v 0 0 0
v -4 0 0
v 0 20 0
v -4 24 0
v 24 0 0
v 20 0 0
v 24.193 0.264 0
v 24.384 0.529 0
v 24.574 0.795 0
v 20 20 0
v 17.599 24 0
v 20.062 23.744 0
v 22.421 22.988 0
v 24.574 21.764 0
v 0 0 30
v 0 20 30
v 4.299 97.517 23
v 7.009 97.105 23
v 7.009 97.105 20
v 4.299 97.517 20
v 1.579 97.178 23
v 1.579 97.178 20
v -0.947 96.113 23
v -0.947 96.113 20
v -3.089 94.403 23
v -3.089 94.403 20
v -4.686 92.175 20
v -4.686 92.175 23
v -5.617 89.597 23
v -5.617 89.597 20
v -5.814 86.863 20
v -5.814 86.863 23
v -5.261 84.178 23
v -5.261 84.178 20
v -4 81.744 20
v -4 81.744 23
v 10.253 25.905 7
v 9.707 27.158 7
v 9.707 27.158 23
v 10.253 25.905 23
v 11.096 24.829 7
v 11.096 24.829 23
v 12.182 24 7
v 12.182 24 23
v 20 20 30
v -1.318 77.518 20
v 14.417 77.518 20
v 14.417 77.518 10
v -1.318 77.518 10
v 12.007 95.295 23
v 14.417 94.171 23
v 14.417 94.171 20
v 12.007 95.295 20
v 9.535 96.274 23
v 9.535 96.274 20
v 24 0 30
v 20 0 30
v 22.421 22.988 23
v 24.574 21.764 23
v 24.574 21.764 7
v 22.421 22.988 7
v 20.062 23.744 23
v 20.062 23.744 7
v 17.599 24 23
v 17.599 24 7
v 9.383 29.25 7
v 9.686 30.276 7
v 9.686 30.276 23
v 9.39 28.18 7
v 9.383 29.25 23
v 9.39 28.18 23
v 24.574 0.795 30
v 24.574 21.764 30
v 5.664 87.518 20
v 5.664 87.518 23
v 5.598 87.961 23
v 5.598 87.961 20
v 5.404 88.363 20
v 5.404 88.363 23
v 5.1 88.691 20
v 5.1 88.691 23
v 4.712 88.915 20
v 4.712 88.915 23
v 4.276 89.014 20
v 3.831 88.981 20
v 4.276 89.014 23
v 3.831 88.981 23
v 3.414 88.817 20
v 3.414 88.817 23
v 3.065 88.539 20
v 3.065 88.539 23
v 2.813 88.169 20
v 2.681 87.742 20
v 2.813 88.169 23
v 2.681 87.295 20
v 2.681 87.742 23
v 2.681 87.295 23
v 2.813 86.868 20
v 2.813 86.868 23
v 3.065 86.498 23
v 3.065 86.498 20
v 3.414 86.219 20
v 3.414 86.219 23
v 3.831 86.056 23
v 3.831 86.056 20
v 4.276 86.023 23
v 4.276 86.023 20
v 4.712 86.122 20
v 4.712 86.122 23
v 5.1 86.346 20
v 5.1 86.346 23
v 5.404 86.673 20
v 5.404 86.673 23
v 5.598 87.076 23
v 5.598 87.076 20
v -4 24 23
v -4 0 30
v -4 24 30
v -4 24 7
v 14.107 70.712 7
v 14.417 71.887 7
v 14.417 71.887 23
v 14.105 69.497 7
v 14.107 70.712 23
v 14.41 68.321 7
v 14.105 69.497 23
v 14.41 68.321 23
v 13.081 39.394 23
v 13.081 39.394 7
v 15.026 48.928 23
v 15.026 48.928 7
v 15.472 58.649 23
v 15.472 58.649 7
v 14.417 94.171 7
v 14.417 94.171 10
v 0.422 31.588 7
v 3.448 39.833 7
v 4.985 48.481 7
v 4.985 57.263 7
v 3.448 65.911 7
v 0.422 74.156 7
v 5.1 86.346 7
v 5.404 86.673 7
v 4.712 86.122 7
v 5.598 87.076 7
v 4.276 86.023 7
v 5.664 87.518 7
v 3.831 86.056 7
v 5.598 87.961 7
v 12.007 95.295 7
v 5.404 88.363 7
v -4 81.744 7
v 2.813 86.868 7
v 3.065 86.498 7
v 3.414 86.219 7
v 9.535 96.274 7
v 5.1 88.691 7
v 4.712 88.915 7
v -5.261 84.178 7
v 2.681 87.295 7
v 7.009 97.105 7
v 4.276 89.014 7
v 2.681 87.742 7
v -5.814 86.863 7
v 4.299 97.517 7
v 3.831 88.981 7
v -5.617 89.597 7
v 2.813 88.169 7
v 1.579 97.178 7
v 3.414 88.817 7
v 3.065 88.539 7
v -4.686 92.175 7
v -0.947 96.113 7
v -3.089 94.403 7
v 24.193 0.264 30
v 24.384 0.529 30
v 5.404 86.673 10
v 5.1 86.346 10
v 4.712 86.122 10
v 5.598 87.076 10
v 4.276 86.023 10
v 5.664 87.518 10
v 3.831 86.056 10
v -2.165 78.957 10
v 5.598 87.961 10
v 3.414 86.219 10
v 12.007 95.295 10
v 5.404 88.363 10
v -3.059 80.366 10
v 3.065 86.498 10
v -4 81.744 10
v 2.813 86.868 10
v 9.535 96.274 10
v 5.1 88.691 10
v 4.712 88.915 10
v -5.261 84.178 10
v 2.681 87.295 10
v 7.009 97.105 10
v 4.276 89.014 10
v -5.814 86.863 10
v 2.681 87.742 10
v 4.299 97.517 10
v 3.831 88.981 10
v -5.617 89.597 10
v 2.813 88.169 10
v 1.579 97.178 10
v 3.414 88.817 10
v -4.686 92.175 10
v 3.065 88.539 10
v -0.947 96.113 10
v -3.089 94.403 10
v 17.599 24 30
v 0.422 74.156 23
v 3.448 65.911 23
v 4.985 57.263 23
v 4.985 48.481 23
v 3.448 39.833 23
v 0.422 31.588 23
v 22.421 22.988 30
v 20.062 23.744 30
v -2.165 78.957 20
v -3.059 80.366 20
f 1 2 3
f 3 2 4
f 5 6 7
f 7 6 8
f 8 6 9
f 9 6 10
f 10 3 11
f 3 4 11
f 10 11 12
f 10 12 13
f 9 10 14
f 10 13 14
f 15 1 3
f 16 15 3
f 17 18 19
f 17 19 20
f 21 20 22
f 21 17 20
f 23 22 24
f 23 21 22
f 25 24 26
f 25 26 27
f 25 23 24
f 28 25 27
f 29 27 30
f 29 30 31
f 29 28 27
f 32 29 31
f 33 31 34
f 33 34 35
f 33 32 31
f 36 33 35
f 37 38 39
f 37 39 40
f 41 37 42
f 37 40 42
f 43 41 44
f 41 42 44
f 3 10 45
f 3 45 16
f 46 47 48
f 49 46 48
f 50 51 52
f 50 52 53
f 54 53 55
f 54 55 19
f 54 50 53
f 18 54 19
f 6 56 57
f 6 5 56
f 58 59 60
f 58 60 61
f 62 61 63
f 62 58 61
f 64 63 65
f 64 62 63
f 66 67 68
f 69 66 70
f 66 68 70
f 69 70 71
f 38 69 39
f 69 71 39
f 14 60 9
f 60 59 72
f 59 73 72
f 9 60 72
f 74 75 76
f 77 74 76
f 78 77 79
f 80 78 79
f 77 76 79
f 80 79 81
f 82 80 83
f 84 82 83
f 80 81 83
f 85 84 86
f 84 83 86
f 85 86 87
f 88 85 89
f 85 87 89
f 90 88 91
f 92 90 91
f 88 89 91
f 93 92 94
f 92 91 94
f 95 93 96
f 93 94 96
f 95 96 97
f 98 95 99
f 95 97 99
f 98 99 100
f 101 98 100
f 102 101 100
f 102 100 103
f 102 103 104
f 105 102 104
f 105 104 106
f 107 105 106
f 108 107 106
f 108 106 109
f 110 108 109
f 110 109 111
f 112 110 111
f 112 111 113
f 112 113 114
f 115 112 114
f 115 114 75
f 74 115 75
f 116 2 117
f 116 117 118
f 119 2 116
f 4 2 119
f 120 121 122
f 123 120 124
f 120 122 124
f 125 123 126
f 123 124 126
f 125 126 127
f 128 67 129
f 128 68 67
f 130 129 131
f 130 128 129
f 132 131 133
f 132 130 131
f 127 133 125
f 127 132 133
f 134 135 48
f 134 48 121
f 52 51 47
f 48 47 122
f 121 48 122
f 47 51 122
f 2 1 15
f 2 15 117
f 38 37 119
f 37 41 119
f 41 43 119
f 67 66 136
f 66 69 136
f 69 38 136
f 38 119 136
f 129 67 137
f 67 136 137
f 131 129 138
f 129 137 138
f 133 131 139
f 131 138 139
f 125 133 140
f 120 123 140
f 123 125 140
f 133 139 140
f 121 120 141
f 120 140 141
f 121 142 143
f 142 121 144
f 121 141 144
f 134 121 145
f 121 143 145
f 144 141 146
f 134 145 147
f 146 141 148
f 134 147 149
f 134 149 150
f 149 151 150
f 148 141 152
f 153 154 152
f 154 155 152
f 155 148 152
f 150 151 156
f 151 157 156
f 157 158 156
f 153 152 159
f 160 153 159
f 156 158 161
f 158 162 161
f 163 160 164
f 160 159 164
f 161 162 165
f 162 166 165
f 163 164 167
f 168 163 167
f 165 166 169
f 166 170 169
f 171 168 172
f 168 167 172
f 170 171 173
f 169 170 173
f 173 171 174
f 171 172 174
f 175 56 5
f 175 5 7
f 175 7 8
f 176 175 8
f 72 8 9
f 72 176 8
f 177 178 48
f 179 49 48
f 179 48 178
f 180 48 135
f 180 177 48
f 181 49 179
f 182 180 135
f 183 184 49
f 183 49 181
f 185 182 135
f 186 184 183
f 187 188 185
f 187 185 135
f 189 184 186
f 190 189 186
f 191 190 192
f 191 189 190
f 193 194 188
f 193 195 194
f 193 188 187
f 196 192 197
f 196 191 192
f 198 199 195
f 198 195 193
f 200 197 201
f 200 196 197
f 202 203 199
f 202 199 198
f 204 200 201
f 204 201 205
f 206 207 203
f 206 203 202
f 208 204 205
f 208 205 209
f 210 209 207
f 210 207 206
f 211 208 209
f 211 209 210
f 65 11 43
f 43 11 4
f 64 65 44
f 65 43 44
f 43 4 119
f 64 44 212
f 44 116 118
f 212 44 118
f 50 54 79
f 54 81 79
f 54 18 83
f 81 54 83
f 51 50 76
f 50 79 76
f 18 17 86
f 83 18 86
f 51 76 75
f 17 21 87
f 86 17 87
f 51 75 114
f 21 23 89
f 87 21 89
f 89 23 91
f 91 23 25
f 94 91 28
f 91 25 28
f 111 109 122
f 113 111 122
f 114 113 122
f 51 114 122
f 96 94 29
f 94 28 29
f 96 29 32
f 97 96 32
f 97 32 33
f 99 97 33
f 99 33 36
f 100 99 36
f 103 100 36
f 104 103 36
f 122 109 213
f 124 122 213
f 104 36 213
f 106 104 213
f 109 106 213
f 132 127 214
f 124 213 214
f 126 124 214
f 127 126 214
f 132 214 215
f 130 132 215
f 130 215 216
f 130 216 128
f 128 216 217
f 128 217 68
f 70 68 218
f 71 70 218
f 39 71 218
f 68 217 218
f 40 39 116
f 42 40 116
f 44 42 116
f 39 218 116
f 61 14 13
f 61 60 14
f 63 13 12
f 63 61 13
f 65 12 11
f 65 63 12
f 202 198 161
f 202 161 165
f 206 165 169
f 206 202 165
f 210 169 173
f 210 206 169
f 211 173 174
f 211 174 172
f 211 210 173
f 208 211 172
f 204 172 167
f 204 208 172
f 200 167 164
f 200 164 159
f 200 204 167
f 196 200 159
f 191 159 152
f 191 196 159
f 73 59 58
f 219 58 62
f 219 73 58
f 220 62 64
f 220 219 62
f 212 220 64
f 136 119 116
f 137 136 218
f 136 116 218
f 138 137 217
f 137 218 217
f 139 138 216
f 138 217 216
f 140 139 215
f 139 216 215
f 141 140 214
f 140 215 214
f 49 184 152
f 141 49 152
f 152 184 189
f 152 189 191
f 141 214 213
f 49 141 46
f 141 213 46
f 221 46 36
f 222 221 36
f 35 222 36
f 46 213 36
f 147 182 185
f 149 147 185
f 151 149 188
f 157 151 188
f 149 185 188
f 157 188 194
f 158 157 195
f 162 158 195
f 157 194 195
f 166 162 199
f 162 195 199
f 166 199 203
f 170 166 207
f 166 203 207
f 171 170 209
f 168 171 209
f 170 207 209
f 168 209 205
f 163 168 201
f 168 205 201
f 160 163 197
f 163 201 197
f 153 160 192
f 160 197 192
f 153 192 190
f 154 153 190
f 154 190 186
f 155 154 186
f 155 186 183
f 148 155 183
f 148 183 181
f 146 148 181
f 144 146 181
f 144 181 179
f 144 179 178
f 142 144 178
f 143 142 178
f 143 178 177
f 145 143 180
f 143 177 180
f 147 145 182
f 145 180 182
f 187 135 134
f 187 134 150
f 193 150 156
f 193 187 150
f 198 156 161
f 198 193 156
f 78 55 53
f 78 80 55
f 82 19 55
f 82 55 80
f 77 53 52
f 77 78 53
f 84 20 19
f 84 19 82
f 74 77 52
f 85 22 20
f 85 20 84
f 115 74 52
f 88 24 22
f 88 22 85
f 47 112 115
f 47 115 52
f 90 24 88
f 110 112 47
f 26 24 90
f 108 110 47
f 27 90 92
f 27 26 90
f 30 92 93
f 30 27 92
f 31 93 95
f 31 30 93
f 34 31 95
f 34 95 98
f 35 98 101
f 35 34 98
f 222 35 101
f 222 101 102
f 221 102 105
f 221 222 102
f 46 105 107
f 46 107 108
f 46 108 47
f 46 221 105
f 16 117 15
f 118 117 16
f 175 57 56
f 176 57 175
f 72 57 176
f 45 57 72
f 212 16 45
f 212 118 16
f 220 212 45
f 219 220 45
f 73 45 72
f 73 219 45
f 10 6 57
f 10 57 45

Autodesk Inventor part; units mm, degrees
ref_plane "YZ Plane" through (0, 0, 0) normal (1, 0, 0) x (0, 1, 0)
sketch "Эскиз1" plane through (0, 0, 0) normal (0, 0, 1) x (1, 0, 0)
  line L0 (0, 0) -> (20, 0) construction
  line L1 (20, 0) -> (20, 20) construction
  line L2 (20, 20) -> (0, 20) construction
  line L3 (0, 20) -> (0, 0) construction
  line L4 (0, 0) -> (0, 20)
  line L5 (0, 0) -> (-4, 0)
  line L6 (-4, 0) -> (-4, 24)
  line L7 (-4, 24) -> (24, 24)
  line L8 (24, 24) -> (24, 0)
  line L9 (24, 0) -> (20, 0)
  line L10 (20, 0) -> (20, 20)
  line L11 (20, 20) -> (0, 20)
  dimension "d0" = 20
  dimension "d1" = 4
  dimension "d2" = 4
extrude "Выдавливание1" add sketch "Эскиз1" along normal blind 30
sketch "Эскиз2" plane through (0, 0, 30) normal (0, 0, 1) x (1, 0, 0)
  line L0 (24, 0) -> (24, 24) projected
  arc A0 (24, 0) -> (38.6, 61.3222) centre (-41.6488, 48.0293) ccw
  arc A1 (38.6, 61.3222) -> (7.0088, 97.1053) centre (-5.7899, 53.9692) ccw
  line L1 (-4, 24) -> (-4, 0) projected
  arc A2 (-4, 24) -> (-4, 81.744) centre (-44.8217, 52.872) ccw
  arc A3 (7.0088, 97.1053) -> (-4, 81.744) centre (4.1643, 87.5184) ccw
  circle A4 centre (4.1643, 87.5184) radius 1.5
  line L2 (24, 24) -> (-4, 24) projected
  point P0 (0, 0)
  dimension "d5" = 10
  dimension "d6" = 3
  dimension "d7" = 50
extrude "Выдавливание2" add sketch "Эскиз2" against normal up to surface (30 mm away)
ref_plane "РабПлоскость1" through (-5.8357, 87.5184, 30) normal (-1, 0, 0) x (0, 0, 1)
sketch "Эскиз4" plane through (-5.8357, 87.5184, 30) normal (-1, 0, 0) x (0, 0, 1)
  line L0 (-20, 10) -> (-10, 10)
  line L1 (-10, 10) -> (-10, -10)
  line L2 (-10, -10) -> (-20, -10)
  line L3 (-20, -10) -> (-20, 10)
  line L4 (0, 10) -> (-30, 10) projected
  point P0 (-30, -87.5184)
  point P1 (-15, 10)
  dimension "d10" = 10
  dimension "d11" = 20
extrude "Выдавливание3" cut sketch "Эскиз4" against normal through all
sketch "Эскиз5" plane through (-5.8357, 87.5184, 30) normal (-1, 0, 0) x (0, 0, 1)
  line L0 (-30, -26.1962) -> (-30, -87.5184) projected
  line L1 (-30, -63.5184) -> (-23, -63.5184)
  line L2 (-23, -63.5184) -> (-23, -16.5184)
  line L3 (-23, -16.5184) -> (-30, -16.5184)
  line L4 (-30, -16.5184) -> (-30, -63.5184)
  line L5 (-30, -63.5184) -> (0, -63.5184) projected
  dimension "d14" = 7
  dimension "d15" = 47
extrude "Выдавливание4" cut sketch "Эскиз5" against normal through all
ref_plane "РабПлоскость2" through (0, 0, 15) normal (0, 0, -1) x (-1, 0, 0)
mirror "Зеркальное отражение1" about plane through (0, 0, 15) normal (0, 0, -1) of "Выдавливание4"
fillet "Сопряжение1" radius 12 2 edges at (36.0633, 24, 3.5) (36.0633, 24, 26.5)
fillet "Сопряжение2" radius 12 2 edges at (35.8572, 71, 3.5) (35.8572, 71, 26.5)
sketch "Эскиз6" plane through (-4, 24, 23) normal (0, 0, 1) x (1, 0, 0)
  arc A0 (17, 4.7391) -> (22, 45) centre (-43.2292, 32.6599) ccw construction
  arc A1 (20.3144, 3.2026) -> (25.5896, 45.6791) centre (-43.2292, 32.6599) ccw
  arc A2 (13.6856, 6.2756) -> (18.4104, 44.3209) centre (-43.2292, 32.6599) ccw
  arc A3 (13.6856, 6.2756) -> (20.3144, 3.2026) centre (17, 4.7391) ccw
  arc A4 (25.5896, 45.6791) -> (18.4104, 44.3209) centre (22, 45) ccw
  line L0 (0, 0) -> (0, -24) projected
  point P0 (4, -24)
  dimension "d20" = 17
  dimension "d21" = 45
  dimension "d22" = 22
extrude "Выдавливание5" cut sketch "Эскиз6" against normal through all
sketch "Эскиз7" plane through (-4, 24, 23) normal (0, 0, 1) x (1, 0, 0)
  arc A0 (31.8516, -18.235) -> (42.6, 37.3222) centre (-37.6488, 24.0293) ccw projected
  arc A1 (31.8516, -18.235) -> (21.5986, 0) centre (21.5986, -12) ccw projected
  arc A2 (42.6, 37.3222) -> (19.593, 69.5583) centre (-1.7899, 29.9692) ccw projected
  arc A3 (13.8903, 47) -> (19.593, 69.5583) centre (13.8903, 59) ccw projected
  arc A4 (13.6856, 6.2756) -> (18.4104, 44.3209) centre (-43.2292, 32.6599) ccw projected
  arc A5 (13.8903, 47) -> (19.593, 69.5583) centre (13.8903, 59) ccw projected
  arc A6 (18.4174, 47.8867) -> (19.593, 69.5583) centre (13.9238, 58.9982) ccw
  line L0 (0, 0) -> (21.5986, 0) projected
  arc A7 (13.9667, 6.8907) -> (21.5986, 0) centre (18.8905, 4.6723) ccw
  arc A8 (18.4174, 47.8867) -> (18.4104, 44.3209) centre (22.8221, 46.0952) ccw
  point P0 (4, -24)
  point P1 (19.6658, 69.519)
  point P2 (16.1824, 0)
extrude "Выдавливание6" cut sketch "Эскиз7" against normal blind 36 contours A1 L0 A7 A4 A8 A6 A2 A0
sketch "Эскиз8" plane through (-4, 0, 0) normal (-1, 0, 0) x (0, 0, 1)
  point P0 (0, 0)
sketch "Эскиз9" plane through (-5.8357, 87.5184, 30) normal (-1, 0, 0) x (0, 0, 1)
  line L0 (-23, -16.5184) -> (-23, -63.5184) projected
  line L1 (-23, -16.5184) -> (-46.8016, -16.5184)
  line L2 (-46.8016, -16.5184) -> (-46.8016, 17.3569)
  line L3 (-46.8016, 17.3569) -> (-23, 17.3569)
  line L4 (-23, 17.3569) -> (-23, -16.5184)
  point P0 (-30, -87.5184)
extrude "Выдавливание7" cut sketch "Эскиз9" against normal blind 36
mirror "Зеркальное отражение2" about plane through (0, 0, 15) normal (0, 0, -1) of "Выдавливание7"
sketch "Эскиз10" plane through (0, 0, 30) normal (0, 0, 1) x (1, 0, 0)
  line L0 (24.5745, 0) -> (35.4567, 0)
  line L1 (35.4567, 0) -> (35.4567, 28.8198)
  line L2 (35.4567, 28.8198) -> (24.5745, 28.8198)
  line L3 (24.5745, 28.8198) -> (24.5745, 0)
  point P0 (0, 0)
extrude "Выдавливание8" cut sketch "Эскиз10" against normal through all
sketch "Эскиз11" plane through (-44.8217, 52.872, 23) normal (0, 0, 1) x (1, 0, 0)
  arc A0 (59.2391, 19.0147) -> (60.4874, 40.647) centre (54.7454, 30.1262) ccw projected
  line L0 (59.2391, 19.0147) -> (70.8374, 19.0147)
  line L1 (70.8374, 19.0147) -> (70.8374, 43.6051)
  line L2 (70.8374, 43.6051) -> (59.2391, 43.6051)
  line L3 (59.2391, 43.6051) -> (59.2391, 19.0147)
  point P0 (44.8217, -52.872)
extrude "Выдавливание9" cut sketch "Эскиз11" against normal through all
properties part number "shok_absorber_holder"
